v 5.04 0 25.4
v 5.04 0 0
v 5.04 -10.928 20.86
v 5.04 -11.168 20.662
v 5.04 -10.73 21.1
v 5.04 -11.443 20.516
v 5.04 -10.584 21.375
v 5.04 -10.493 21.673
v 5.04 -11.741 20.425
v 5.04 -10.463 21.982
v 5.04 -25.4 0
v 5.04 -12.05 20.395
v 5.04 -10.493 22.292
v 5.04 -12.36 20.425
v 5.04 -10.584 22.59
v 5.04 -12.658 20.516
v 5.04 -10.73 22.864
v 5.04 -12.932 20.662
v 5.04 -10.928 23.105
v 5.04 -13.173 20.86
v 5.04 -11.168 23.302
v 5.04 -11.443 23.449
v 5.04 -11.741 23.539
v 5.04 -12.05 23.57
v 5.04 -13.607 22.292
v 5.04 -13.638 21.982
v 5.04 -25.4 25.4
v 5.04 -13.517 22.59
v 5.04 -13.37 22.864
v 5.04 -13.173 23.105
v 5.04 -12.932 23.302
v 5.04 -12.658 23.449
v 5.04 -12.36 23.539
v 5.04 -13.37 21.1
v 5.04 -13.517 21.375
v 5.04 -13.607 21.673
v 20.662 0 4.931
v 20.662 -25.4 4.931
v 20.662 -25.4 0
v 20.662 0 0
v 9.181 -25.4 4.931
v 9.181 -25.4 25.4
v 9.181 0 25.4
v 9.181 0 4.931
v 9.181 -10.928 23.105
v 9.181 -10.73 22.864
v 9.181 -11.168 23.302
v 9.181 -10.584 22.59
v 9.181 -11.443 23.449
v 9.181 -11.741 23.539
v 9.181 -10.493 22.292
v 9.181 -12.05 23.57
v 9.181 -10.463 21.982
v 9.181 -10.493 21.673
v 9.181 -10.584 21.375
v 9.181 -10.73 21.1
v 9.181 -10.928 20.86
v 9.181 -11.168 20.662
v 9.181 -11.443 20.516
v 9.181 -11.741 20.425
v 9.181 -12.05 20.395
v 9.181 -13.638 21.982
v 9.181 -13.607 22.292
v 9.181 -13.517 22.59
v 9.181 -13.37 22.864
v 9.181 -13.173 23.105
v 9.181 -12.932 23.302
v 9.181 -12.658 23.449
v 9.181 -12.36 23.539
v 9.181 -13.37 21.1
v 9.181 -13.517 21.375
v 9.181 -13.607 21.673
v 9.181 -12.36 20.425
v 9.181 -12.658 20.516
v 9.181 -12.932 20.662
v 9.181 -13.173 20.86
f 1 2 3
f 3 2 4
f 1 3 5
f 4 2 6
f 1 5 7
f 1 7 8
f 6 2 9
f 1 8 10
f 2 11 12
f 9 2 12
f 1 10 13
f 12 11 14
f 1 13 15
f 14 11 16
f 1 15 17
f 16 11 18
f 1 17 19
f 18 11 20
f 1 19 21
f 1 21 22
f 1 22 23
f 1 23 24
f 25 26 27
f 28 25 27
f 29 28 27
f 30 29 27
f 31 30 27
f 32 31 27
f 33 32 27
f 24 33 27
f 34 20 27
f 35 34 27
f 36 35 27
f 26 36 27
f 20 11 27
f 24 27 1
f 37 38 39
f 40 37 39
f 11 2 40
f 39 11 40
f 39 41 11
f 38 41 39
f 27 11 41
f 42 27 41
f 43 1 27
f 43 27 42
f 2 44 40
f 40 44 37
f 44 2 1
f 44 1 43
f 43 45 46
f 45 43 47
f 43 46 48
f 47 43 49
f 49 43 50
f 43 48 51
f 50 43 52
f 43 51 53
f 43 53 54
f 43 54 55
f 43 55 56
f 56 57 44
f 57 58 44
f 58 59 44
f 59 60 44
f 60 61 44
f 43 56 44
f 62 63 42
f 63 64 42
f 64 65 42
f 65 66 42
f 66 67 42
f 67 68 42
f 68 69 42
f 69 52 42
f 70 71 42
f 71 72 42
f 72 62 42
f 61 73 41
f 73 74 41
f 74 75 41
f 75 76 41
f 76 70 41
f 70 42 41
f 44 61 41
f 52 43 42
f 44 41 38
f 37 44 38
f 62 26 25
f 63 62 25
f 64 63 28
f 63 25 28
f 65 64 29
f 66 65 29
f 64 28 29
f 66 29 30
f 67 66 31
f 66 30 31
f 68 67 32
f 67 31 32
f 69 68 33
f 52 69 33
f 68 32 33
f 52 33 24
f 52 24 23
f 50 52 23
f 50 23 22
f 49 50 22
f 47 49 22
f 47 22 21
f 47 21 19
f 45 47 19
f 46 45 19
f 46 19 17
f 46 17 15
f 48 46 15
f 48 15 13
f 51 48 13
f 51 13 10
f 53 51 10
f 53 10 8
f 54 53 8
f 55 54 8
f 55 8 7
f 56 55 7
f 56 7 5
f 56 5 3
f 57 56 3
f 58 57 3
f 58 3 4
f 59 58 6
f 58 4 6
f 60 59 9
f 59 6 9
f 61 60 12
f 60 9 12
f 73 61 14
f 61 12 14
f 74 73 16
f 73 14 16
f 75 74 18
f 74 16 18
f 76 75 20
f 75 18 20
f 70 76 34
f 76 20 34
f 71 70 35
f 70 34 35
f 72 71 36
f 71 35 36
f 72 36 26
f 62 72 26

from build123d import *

# Parameters (mm, degrees)
F0_W     = 25.4
F0_H     = 25.4
F1_DEPTH = 25.4
F2_W     = 5.039918
F2_H     = 25.4
F3_DEPTH = 38.1
F4_R     = 1.5875
F5_DEPTH = 12.7


with BuildPart() as f1:
    # F0 (on Front) → F1 (new body)
    with BuildSketch(Plane.XZ):
        with Locations((12.7, 12.7)):
            Rectangle(F0_W, F0_H)
    extrude(amount=F1_DEPTH)

    # F2 (on face) → F3 (cut)
    with BuildSketch(Plane.XZ.offset(25.4)):
        Polygon((25.4, 25.4), (9.180619, 25.4), (9.180619, 4.931298), (20.66166, 4.931298), (20.66166, 0), (25.4, 0), align=None)
        with Locations((2.519959, 12.7)):
            Rectangle(F2_W, F2_H)
    extrude(amount=-F3_DEPTH, mode=Mode.SUBTRACT)

    # F4 (on face) → F5 (cut)
    with BuildSketch(Plane(origin=(5.039918, 0, 0), x_dir=(0, -1, 0), z_dir=(-1, 0, 0))):
        with Locations((12.050226, 21.982256)):
            Circle(F4_R)
    extrude(amount=-F5_DEPTH, mode=Mode.SUBTRACT)


solid = f1.part
